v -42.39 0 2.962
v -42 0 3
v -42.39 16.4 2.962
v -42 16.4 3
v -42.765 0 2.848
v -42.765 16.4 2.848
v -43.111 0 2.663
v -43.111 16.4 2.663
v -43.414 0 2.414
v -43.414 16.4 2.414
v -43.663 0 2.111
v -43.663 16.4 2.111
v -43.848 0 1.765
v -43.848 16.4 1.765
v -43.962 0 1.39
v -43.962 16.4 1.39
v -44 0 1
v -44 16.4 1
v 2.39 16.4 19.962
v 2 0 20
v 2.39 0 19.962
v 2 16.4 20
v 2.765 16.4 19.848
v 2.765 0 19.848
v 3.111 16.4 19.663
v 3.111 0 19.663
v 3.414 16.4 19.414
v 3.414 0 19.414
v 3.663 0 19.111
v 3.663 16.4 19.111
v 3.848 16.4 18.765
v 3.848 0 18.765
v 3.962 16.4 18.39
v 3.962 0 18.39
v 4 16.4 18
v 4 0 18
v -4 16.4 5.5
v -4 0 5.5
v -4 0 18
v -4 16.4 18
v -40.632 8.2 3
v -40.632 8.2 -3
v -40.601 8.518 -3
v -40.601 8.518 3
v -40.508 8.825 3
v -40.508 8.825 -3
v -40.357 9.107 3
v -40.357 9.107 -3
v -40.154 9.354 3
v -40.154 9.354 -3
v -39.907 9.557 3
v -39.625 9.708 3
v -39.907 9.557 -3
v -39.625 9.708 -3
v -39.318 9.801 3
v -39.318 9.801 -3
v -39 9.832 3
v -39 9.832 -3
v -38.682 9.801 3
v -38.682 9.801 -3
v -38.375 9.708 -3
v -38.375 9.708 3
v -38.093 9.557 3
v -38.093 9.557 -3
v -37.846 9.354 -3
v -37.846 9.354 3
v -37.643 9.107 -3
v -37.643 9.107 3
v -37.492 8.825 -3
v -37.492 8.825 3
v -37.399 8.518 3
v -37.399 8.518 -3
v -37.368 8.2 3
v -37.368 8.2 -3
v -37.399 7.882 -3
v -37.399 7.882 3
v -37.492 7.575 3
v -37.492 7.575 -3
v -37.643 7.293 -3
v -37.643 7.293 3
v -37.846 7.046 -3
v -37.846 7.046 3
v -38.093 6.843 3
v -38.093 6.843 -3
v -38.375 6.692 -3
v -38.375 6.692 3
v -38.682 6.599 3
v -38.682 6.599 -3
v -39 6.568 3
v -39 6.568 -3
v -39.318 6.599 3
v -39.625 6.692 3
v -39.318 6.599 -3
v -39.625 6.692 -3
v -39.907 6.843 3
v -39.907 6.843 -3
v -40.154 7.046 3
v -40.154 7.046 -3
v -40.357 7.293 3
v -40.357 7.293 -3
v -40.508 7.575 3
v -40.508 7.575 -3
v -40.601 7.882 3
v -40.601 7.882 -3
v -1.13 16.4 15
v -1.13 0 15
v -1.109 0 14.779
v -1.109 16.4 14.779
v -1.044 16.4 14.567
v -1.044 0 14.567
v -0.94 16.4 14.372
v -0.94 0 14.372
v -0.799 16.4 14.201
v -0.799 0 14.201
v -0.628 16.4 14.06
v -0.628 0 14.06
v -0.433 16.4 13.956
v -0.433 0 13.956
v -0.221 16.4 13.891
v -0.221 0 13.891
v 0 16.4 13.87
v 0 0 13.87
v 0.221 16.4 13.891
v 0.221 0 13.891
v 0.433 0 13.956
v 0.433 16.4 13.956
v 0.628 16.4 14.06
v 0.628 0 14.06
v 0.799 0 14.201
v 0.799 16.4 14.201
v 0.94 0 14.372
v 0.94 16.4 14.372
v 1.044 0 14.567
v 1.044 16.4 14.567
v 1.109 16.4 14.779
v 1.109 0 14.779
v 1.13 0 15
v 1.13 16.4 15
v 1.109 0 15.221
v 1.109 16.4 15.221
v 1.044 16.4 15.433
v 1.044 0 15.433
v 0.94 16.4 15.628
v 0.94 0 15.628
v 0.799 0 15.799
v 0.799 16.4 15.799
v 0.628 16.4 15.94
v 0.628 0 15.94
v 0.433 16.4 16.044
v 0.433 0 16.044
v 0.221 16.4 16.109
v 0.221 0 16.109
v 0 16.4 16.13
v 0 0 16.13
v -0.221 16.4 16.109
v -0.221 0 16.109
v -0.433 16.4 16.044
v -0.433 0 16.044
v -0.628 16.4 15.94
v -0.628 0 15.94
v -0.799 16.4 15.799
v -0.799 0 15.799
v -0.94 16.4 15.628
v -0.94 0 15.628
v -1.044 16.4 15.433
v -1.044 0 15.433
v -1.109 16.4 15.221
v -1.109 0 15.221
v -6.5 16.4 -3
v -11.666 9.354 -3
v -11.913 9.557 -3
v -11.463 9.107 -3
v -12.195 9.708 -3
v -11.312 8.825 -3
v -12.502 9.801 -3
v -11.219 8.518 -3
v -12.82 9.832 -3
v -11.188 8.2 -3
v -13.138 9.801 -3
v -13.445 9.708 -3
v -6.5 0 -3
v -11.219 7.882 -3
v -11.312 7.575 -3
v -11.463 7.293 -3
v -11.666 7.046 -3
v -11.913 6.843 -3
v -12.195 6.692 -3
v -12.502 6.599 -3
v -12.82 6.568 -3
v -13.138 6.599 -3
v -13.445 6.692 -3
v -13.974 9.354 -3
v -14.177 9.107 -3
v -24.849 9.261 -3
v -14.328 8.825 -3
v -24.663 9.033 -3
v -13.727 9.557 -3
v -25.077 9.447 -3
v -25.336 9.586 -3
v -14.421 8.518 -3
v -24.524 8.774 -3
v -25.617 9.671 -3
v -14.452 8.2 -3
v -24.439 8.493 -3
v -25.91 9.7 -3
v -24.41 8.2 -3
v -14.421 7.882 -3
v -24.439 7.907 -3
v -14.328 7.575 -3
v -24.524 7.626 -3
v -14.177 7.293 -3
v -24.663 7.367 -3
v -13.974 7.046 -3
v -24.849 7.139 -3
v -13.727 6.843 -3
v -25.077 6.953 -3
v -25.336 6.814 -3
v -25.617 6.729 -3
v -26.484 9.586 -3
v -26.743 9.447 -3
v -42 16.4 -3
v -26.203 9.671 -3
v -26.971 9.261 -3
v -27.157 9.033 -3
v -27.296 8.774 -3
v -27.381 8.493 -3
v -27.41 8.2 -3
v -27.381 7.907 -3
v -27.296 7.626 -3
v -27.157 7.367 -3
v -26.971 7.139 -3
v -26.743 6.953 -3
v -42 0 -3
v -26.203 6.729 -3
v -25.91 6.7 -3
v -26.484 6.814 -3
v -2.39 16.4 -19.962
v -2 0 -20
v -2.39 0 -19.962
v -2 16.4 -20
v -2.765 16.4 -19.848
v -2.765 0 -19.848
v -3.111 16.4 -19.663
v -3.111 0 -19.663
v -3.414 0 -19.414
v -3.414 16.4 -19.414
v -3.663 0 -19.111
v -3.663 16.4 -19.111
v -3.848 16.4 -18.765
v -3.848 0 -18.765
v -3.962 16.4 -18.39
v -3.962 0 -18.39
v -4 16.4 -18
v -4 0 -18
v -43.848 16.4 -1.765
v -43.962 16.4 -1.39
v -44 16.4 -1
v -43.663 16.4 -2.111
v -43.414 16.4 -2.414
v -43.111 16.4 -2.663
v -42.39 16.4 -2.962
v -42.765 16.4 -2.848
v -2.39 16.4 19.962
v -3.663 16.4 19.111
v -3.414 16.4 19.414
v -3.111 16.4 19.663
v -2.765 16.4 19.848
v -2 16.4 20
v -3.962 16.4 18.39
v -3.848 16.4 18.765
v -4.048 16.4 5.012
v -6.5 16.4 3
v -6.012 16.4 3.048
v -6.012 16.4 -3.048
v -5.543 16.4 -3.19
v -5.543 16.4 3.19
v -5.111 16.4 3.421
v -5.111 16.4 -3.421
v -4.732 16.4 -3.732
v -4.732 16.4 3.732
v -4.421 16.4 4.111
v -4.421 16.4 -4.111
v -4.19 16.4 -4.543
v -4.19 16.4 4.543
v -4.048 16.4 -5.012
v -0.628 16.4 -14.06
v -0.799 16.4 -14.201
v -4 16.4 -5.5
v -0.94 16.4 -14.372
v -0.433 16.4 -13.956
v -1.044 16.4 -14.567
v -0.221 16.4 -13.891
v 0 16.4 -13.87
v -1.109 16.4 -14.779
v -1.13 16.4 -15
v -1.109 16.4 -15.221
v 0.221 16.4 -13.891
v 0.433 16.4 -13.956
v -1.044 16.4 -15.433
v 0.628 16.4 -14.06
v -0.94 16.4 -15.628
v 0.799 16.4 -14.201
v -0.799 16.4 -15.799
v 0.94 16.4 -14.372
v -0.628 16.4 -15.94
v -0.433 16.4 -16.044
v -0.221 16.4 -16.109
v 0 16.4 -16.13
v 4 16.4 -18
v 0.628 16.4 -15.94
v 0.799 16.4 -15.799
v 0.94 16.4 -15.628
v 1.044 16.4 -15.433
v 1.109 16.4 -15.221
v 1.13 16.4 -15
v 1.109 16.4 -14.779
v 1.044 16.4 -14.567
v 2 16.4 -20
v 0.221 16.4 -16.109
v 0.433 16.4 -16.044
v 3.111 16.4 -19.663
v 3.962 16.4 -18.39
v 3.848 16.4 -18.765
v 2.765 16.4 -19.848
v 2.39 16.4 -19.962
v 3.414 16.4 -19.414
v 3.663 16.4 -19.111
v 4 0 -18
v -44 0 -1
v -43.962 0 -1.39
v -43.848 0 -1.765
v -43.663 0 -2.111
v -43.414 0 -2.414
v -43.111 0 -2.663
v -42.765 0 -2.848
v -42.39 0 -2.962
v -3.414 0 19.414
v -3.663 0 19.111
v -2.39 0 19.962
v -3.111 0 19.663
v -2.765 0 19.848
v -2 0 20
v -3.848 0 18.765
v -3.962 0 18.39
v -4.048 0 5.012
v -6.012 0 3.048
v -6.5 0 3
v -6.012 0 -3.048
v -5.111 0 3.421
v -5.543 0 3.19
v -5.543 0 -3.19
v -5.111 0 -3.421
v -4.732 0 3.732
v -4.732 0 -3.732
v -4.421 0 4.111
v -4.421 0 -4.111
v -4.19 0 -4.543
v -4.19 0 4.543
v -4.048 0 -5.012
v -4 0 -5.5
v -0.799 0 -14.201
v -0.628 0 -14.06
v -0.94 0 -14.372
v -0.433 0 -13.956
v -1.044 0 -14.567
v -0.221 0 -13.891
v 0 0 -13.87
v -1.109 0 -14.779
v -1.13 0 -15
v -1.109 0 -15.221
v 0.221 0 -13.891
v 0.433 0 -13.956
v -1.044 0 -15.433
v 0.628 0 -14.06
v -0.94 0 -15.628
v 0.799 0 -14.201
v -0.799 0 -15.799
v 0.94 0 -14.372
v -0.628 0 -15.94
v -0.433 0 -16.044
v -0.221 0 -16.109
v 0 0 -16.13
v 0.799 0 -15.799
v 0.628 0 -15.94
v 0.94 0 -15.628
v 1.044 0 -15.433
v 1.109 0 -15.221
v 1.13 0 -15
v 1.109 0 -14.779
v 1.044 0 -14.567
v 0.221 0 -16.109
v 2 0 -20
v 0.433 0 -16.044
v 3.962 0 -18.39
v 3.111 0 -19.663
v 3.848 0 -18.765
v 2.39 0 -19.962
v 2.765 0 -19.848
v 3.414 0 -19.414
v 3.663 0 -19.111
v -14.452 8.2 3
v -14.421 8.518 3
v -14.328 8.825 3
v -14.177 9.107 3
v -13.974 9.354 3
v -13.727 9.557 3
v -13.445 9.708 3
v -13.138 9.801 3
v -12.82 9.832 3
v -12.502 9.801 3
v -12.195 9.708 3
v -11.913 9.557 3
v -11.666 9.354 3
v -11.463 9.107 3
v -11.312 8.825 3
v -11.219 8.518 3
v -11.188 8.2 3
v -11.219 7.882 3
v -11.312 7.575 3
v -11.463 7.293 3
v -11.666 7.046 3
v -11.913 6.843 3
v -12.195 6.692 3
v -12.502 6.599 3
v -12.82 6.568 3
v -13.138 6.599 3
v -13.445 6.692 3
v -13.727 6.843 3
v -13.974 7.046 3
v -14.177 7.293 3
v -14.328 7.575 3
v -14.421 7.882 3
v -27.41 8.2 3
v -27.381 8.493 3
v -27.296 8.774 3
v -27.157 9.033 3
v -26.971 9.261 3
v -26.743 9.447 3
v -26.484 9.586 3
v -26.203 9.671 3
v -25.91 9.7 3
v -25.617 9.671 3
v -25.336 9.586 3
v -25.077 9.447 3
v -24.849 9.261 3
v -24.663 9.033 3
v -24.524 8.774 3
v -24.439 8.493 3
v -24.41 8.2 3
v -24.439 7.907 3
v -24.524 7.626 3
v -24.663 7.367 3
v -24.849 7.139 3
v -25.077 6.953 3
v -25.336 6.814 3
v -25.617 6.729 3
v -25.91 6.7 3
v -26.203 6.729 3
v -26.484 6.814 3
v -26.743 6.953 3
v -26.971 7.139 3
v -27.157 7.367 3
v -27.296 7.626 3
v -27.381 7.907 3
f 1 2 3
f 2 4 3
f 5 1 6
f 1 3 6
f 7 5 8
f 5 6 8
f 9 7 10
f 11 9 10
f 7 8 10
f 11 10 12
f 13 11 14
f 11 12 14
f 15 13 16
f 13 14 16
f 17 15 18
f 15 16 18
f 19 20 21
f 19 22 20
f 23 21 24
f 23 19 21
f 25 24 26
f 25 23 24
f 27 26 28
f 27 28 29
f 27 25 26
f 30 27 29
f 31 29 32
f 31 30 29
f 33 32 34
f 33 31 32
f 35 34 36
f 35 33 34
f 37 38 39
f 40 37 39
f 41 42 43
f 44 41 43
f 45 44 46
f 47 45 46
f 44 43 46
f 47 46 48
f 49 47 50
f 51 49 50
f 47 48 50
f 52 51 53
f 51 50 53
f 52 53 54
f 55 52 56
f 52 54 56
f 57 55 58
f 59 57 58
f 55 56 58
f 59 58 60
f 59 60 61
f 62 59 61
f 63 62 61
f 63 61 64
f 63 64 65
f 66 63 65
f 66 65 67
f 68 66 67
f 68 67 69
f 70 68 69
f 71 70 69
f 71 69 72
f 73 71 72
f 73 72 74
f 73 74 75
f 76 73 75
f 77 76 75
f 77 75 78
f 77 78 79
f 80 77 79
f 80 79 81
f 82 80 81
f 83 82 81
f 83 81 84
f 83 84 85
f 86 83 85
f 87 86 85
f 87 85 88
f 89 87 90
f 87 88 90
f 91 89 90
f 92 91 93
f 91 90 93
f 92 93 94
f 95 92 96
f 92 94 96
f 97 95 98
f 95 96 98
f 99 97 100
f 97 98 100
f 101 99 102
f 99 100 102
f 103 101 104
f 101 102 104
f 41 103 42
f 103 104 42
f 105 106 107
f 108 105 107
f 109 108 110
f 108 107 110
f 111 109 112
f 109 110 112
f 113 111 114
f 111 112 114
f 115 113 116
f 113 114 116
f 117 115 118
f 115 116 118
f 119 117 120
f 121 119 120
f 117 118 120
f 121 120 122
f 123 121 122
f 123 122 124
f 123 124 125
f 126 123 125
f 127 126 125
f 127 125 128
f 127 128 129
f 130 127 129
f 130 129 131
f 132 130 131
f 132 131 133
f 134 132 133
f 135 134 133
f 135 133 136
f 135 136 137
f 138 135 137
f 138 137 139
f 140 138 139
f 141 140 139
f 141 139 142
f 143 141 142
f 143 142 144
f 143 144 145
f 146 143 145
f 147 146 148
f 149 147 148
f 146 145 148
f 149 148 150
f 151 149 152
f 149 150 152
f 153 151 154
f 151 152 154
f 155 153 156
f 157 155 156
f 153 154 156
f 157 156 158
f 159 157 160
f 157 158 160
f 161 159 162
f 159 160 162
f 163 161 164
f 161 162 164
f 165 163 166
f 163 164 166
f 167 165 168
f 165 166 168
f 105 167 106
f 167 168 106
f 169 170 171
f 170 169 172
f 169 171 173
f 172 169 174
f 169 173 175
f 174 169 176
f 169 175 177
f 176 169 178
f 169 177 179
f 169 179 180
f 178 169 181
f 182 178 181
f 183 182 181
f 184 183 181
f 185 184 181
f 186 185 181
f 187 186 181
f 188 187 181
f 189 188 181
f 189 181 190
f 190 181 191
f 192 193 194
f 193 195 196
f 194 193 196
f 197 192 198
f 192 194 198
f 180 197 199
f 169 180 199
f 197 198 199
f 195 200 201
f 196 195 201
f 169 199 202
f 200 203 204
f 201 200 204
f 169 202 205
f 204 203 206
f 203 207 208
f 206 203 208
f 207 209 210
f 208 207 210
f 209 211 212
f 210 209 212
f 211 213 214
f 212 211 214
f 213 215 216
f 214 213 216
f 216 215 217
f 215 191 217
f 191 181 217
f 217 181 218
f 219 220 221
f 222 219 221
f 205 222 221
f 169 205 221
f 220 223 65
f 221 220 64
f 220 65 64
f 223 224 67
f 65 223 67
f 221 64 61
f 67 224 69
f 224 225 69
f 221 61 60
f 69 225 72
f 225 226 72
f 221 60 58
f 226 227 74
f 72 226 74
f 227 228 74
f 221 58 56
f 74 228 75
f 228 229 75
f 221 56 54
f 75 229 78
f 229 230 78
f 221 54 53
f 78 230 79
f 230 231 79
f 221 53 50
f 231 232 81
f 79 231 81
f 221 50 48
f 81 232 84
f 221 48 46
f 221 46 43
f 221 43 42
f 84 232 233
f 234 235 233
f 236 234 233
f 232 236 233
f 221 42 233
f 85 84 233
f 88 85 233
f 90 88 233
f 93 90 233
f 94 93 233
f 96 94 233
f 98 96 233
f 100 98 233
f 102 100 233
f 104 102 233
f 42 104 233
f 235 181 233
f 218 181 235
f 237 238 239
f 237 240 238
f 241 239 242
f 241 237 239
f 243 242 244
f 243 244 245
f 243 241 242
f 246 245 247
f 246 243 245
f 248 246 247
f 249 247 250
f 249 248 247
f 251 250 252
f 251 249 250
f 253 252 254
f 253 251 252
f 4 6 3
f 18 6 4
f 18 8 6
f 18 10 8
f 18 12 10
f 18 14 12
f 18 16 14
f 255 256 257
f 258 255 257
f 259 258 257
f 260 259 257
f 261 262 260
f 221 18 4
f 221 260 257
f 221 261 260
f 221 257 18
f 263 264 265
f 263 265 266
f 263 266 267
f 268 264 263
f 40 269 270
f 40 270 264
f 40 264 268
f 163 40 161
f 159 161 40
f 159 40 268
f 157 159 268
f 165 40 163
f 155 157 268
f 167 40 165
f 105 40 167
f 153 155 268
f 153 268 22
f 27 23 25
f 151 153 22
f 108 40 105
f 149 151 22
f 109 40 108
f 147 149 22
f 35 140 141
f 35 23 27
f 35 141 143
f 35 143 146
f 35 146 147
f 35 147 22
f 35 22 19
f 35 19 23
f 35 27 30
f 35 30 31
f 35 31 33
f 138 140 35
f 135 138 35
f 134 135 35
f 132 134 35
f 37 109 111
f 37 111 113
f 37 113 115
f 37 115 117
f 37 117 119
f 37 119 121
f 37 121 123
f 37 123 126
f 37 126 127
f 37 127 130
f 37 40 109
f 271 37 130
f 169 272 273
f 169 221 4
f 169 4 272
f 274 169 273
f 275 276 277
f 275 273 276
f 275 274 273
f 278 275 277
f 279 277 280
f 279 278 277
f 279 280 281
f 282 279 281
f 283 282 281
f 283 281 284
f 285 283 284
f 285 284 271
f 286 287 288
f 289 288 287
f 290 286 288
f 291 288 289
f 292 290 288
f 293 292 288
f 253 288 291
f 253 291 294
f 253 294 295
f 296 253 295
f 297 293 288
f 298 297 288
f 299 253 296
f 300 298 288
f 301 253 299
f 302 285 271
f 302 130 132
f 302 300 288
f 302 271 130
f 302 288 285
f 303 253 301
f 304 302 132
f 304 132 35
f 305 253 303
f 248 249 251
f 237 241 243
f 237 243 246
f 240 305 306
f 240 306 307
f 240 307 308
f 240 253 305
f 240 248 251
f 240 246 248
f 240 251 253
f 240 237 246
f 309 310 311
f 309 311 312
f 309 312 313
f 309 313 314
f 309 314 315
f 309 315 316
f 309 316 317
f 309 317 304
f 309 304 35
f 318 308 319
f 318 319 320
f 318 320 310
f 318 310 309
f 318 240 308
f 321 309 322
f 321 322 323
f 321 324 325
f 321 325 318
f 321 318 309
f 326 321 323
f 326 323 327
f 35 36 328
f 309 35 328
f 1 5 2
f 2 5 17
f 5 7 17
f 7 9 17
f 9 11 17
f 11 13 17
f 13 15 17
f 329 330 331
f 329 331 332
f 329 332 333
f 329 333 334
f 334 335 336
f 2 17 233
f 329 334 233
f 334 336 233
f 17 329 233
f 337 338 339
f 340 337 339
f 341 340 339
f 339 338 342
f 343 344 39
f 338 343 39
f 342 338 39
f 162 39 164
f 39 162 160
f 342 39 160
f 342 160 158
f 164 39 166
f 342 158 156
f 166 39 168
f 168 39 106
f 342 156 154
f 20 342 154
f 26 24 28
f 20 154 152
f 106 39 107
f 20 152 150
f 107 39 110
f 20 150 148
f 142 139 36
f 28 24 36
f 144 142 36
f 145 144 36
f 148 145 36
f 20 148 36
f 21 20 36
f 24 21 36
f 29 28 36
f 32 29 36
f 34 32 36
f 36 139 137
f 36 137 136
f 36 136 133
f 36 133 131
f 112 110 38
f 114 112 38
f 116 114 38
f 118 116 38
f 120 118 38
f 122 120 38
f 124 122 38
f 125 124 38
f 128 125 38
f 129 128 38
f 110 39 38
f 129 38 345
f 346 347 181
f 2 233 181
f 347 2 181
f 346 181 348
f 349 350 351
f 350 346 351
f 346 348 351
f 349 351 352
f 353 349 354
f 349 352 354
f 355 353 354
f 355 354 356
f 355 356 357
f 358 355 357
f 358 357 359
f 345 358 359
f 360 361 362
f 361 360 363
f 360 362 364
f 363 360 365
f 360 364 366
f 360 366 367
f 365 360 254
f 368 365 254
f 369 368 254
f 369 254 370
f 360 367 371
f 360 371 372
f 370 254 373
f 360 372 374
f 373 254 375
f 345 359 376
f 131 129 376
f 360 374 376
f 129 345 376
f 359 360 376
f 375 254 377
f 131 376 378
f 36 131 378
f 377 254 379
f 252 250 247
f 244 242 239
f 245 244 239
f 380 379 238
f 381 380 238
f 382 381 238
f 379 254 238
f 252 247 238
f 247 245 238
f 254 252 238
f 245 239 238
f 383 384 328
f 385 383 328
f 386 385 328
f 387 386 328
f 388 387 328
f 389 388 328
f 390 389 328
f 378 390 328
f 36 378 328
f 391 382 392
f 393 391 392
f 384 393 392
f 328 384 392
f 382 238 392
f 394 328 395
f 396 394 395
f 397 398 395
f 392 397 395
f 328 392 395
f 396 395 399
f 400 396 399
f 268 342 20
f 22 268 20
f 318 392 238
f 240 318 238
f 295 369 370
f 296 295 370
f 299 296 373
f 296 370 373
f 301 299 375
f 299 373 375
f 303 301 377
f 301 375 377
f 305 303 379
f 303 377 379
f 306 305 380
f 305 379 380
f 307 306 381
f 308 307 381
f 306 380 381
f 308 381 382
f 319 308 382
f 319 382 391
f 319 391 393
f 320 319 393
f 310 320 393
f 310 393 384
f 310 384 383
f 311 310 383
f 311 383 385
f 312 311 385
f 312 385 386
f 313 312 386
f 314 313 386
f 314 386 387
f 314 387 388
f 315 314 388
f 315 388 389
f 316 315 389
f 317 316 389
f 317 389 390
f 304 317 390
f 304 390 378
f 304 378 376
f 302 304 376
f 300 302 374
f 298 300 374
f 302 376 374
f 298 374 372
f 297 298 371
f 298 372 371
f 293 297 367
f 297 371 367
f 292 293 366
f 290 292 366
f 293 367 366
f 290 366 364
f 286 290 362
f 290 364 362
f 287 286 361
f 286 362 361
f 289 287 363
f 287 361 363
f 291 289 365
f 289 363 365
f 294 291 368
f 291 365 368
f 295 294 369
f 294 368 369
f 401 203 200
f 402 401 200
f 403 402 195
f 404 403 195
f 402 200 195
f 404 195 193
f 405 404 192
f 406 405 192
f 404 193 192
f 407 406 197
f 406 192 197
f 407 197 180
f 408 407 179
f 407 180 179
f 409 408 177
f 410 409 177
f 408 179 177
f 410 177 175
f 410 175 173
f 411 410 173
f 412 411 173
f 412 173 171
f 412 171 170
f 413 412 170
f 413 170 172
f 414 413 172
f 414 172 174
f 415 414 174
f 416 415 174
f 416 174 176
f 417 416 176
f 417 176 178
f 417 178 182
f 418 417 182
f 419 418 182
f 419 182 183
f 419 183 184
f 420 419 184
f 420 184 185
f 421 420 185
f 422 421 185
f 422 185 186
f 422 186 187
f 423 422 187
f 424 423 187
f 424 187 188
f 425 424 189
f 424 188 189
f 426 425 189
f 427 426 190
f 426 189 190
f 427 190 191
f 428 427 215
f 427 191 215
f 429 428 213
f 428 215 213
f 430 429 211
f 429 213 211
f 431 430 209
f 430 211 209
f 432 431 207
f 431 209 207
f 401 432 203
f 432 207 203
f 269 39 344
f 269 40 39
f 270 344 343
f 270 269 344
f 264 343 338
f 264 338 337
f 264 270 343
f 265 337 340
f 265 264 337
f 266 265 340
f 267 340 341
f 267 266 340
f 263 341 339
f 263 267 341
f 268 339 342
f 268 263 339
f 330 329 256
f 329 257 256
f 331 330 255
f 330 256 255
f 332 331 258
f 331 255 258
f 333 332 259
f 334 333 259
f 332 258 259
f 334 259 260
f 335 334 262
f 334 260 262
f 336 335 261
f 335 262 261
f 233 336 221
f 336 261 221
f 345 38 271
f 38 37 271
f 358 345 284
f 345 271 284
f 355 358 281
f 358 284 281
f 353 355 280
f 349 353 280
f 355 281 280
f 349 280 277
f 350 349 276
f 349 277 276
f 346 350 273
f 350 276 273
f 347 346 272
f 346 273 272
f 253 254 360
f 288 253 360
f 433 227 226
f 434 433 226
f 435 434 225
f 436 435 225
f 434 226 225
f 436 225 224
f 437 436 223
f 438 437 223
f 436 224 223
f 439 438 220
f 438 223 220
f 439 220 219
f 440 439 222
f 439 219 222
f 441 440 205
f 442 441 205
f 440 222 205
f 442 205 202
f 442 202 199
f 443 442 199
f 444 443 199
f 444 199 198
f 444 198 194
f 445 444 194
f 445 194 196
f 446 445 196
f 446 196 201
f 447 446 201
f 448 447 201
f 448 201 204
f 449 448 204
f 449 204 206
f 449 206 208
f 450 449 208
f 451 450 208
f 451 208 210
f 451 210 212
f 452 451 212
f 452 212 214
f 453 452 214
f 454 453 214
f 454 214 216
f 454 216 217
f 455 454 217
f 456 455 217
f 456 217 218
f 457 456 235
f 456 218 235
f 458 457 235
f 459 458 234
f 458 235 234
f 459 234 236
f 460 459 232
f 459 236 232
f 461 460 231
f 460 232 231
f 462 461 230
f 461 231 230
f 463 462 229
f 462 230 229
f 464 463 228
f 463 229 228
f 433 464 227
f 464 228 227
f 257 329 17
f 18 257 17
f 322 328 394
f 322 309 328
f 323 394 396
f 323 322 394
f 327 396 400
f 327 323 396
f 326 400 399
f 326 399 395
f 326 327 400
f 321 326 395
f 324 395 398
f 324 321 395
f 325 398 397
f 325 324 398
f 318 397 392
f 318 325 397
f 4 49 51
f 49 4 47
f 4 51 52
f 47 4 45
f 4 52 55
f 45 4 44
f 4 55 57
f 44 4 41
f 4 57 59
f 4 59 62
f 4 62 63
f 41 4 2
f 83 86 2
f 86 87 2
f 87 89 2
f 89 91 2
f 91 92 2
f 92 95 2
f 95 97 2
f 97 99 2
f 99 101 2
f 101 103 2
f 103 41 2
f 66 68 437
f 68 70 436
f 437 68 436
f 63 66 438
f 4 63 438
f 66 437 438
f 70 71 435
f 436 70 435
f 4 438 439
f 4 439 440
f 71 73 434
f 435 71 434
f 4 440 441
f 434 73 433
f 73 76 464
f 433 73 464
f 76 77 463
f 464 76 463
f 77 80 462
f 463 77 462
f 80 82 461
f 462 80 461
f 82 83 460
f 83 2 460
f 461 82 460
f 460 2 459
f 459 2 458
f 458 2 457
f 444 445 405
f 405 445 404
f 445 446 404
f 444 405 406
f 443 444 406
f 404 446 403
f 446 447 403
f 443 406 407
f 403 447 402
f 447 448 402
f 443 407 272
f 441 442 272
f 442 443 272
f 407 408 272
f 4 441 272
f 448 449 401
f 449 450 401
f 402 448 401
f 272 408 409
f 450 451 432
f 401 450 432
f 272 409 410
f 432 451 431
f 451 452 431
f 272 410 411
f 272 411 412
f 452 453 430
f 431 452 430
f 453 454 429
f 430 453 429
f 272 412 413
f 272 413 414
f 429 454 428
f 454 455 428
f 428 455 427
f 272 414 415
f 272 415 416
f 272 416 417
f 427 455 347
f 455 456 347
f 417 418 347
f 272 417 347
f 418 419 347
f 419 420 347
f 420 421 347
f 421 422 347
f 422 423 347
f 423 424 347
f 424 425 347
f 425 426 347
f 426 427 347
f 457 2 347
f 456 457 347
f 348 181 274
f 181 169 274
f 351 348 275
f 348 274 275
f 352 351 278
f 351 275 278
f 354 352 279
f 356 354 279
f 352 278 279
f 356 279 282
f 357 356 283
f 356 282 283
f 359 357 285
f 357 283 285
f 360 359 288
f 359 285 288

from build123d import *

# Parameters (mm, degrees)
BOSS_EXTRUDE1_DEPTH   = 16.4
F_4_40_TAPPED_HOLE1_D = 2.2606
F_3_0MM_DOWEL_HOLE1_D = 3
F_4_CLEARANCE_HOLE1_D = 3.2639
FILLET1_R             = 2.5
FILLET2_R             = 2


with BuildPart() as part:
    # Sketch1 → Boss-Extrude1 (new body)
    with BuildSketch(Plane(origin=(0, 0, 0), x_dir=(1, 0, 0), z_dir=(0, 1, 0))):
        Polygon((-4, -3), (-4, -20), (4, -20), (4, 20), (-4, 20), (-4, 3), (-44, 3), (-44, -3), align=None)
    extrude(amount=BOSS_EXTRUDE1_DEPTH)

    # #4-40 Tapped Hole1 (through all)
    with Locations(Plane(origin=(0, 16.4, 0), x_dir=(1, 0, 0), z_dir=(0, 1, 0))):
        with Locations((0, 15), (0, -15)):
            Hole(F_4_40_TAPPED_HOLE1_D / 2)

    # Ø3.0mm Dowel Hole1 (through all)
    with Locations(Plane.XY.offset(3)):
        with Locations((-25.91, 8.2)):
            Hole(F_3_0MM_DOWEL_HOLE1_D / 2)

    # #4 Clearance Hole1 (through all)
    with Locations(Plane.XY.offset(3)):
        with Locations((-39, 8.2), (-12.82, 8.2)):
            Hole(F_4_CLEARANCE_HOLE1_D / 2)

    # Fillet1
    fillet1_edges = [part.edges().sort_by_distance(p)[0] for p in [
        (-4, 8.2, 3),
        (-4, 8.2, -3),
    ]]
    fillet(fillet1_edges, radius=FILLET1_R)

    # Fillet2
    fillet2_edges = [part.edges().sort_by_distance(p)[0] for p in [
        (4, 8.2, 20),
        (-4, 8.2, 20),
        (-44, 8.2, 3),
        (-44, 8.2, -3),
        (-4, 8.2, -20),
        (4, 8.2, -20),
    ]]
    fillet(fillet2_edges, radius=FILLET2_R)


solid = part.part
